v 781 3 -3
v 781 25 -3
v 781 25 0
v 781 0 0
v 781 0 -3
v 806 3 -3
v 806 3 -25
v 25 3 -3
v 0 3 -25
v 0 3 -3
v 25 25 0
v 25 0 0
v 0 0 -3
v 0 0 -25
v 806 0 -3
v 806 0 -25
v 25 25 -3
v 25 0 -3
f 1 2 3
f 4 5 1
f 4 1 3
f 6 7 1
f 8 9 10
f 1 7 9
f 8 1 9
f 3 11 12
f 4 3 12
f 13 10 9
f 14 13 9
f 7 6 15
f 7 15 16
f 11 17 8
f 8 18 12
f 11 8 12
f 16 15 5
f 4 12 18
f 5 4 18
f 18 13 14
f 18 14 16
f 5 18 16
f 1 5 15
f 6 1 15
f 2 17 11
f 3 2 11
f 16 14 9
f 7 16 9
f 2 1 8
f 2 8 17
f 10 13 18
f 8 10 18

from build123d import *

# Parameters (mm, degrees)
EXTRUDE_1_DEPTH     = 806
SKETCH_2_W          = 25
SKETCH_2_H          = 3
CUT_EXTRUDE_1_DEPTH = 26


with BuildPart() as part:
    # Эскиз1 → Вытянуть-Тонкостенный1 (new body)
    with BuildSketch(Plane(origin=(0, 0, 0), x_dir=(0, 0, -1), z_dir=(1, 0, 0))):
        Polygon((0, 25), (0, 0), (25, 0), (25, 3), (3, 3), (3, 25), align=None)
    extrude(amount=EXTRUDE_1_DEPTH)

    # Эскиз2 → Вырез-Вытянуть1 (cut, through all)
    with BuildSketch(Plane.XZ):
        with Locations((793.5, -1.5)):
            Rectangle(SKETCH_2_W, SKETCH_2_H)
        with Locations((12.5, -1.5)):
            Rectangle(SKETCH_2_W, SKETCH_2_H)
    extrude(amount=-CUT_EXTRUDE_1_DEPTH, mode=Mode.SUBTRACT)


solid = part.part
